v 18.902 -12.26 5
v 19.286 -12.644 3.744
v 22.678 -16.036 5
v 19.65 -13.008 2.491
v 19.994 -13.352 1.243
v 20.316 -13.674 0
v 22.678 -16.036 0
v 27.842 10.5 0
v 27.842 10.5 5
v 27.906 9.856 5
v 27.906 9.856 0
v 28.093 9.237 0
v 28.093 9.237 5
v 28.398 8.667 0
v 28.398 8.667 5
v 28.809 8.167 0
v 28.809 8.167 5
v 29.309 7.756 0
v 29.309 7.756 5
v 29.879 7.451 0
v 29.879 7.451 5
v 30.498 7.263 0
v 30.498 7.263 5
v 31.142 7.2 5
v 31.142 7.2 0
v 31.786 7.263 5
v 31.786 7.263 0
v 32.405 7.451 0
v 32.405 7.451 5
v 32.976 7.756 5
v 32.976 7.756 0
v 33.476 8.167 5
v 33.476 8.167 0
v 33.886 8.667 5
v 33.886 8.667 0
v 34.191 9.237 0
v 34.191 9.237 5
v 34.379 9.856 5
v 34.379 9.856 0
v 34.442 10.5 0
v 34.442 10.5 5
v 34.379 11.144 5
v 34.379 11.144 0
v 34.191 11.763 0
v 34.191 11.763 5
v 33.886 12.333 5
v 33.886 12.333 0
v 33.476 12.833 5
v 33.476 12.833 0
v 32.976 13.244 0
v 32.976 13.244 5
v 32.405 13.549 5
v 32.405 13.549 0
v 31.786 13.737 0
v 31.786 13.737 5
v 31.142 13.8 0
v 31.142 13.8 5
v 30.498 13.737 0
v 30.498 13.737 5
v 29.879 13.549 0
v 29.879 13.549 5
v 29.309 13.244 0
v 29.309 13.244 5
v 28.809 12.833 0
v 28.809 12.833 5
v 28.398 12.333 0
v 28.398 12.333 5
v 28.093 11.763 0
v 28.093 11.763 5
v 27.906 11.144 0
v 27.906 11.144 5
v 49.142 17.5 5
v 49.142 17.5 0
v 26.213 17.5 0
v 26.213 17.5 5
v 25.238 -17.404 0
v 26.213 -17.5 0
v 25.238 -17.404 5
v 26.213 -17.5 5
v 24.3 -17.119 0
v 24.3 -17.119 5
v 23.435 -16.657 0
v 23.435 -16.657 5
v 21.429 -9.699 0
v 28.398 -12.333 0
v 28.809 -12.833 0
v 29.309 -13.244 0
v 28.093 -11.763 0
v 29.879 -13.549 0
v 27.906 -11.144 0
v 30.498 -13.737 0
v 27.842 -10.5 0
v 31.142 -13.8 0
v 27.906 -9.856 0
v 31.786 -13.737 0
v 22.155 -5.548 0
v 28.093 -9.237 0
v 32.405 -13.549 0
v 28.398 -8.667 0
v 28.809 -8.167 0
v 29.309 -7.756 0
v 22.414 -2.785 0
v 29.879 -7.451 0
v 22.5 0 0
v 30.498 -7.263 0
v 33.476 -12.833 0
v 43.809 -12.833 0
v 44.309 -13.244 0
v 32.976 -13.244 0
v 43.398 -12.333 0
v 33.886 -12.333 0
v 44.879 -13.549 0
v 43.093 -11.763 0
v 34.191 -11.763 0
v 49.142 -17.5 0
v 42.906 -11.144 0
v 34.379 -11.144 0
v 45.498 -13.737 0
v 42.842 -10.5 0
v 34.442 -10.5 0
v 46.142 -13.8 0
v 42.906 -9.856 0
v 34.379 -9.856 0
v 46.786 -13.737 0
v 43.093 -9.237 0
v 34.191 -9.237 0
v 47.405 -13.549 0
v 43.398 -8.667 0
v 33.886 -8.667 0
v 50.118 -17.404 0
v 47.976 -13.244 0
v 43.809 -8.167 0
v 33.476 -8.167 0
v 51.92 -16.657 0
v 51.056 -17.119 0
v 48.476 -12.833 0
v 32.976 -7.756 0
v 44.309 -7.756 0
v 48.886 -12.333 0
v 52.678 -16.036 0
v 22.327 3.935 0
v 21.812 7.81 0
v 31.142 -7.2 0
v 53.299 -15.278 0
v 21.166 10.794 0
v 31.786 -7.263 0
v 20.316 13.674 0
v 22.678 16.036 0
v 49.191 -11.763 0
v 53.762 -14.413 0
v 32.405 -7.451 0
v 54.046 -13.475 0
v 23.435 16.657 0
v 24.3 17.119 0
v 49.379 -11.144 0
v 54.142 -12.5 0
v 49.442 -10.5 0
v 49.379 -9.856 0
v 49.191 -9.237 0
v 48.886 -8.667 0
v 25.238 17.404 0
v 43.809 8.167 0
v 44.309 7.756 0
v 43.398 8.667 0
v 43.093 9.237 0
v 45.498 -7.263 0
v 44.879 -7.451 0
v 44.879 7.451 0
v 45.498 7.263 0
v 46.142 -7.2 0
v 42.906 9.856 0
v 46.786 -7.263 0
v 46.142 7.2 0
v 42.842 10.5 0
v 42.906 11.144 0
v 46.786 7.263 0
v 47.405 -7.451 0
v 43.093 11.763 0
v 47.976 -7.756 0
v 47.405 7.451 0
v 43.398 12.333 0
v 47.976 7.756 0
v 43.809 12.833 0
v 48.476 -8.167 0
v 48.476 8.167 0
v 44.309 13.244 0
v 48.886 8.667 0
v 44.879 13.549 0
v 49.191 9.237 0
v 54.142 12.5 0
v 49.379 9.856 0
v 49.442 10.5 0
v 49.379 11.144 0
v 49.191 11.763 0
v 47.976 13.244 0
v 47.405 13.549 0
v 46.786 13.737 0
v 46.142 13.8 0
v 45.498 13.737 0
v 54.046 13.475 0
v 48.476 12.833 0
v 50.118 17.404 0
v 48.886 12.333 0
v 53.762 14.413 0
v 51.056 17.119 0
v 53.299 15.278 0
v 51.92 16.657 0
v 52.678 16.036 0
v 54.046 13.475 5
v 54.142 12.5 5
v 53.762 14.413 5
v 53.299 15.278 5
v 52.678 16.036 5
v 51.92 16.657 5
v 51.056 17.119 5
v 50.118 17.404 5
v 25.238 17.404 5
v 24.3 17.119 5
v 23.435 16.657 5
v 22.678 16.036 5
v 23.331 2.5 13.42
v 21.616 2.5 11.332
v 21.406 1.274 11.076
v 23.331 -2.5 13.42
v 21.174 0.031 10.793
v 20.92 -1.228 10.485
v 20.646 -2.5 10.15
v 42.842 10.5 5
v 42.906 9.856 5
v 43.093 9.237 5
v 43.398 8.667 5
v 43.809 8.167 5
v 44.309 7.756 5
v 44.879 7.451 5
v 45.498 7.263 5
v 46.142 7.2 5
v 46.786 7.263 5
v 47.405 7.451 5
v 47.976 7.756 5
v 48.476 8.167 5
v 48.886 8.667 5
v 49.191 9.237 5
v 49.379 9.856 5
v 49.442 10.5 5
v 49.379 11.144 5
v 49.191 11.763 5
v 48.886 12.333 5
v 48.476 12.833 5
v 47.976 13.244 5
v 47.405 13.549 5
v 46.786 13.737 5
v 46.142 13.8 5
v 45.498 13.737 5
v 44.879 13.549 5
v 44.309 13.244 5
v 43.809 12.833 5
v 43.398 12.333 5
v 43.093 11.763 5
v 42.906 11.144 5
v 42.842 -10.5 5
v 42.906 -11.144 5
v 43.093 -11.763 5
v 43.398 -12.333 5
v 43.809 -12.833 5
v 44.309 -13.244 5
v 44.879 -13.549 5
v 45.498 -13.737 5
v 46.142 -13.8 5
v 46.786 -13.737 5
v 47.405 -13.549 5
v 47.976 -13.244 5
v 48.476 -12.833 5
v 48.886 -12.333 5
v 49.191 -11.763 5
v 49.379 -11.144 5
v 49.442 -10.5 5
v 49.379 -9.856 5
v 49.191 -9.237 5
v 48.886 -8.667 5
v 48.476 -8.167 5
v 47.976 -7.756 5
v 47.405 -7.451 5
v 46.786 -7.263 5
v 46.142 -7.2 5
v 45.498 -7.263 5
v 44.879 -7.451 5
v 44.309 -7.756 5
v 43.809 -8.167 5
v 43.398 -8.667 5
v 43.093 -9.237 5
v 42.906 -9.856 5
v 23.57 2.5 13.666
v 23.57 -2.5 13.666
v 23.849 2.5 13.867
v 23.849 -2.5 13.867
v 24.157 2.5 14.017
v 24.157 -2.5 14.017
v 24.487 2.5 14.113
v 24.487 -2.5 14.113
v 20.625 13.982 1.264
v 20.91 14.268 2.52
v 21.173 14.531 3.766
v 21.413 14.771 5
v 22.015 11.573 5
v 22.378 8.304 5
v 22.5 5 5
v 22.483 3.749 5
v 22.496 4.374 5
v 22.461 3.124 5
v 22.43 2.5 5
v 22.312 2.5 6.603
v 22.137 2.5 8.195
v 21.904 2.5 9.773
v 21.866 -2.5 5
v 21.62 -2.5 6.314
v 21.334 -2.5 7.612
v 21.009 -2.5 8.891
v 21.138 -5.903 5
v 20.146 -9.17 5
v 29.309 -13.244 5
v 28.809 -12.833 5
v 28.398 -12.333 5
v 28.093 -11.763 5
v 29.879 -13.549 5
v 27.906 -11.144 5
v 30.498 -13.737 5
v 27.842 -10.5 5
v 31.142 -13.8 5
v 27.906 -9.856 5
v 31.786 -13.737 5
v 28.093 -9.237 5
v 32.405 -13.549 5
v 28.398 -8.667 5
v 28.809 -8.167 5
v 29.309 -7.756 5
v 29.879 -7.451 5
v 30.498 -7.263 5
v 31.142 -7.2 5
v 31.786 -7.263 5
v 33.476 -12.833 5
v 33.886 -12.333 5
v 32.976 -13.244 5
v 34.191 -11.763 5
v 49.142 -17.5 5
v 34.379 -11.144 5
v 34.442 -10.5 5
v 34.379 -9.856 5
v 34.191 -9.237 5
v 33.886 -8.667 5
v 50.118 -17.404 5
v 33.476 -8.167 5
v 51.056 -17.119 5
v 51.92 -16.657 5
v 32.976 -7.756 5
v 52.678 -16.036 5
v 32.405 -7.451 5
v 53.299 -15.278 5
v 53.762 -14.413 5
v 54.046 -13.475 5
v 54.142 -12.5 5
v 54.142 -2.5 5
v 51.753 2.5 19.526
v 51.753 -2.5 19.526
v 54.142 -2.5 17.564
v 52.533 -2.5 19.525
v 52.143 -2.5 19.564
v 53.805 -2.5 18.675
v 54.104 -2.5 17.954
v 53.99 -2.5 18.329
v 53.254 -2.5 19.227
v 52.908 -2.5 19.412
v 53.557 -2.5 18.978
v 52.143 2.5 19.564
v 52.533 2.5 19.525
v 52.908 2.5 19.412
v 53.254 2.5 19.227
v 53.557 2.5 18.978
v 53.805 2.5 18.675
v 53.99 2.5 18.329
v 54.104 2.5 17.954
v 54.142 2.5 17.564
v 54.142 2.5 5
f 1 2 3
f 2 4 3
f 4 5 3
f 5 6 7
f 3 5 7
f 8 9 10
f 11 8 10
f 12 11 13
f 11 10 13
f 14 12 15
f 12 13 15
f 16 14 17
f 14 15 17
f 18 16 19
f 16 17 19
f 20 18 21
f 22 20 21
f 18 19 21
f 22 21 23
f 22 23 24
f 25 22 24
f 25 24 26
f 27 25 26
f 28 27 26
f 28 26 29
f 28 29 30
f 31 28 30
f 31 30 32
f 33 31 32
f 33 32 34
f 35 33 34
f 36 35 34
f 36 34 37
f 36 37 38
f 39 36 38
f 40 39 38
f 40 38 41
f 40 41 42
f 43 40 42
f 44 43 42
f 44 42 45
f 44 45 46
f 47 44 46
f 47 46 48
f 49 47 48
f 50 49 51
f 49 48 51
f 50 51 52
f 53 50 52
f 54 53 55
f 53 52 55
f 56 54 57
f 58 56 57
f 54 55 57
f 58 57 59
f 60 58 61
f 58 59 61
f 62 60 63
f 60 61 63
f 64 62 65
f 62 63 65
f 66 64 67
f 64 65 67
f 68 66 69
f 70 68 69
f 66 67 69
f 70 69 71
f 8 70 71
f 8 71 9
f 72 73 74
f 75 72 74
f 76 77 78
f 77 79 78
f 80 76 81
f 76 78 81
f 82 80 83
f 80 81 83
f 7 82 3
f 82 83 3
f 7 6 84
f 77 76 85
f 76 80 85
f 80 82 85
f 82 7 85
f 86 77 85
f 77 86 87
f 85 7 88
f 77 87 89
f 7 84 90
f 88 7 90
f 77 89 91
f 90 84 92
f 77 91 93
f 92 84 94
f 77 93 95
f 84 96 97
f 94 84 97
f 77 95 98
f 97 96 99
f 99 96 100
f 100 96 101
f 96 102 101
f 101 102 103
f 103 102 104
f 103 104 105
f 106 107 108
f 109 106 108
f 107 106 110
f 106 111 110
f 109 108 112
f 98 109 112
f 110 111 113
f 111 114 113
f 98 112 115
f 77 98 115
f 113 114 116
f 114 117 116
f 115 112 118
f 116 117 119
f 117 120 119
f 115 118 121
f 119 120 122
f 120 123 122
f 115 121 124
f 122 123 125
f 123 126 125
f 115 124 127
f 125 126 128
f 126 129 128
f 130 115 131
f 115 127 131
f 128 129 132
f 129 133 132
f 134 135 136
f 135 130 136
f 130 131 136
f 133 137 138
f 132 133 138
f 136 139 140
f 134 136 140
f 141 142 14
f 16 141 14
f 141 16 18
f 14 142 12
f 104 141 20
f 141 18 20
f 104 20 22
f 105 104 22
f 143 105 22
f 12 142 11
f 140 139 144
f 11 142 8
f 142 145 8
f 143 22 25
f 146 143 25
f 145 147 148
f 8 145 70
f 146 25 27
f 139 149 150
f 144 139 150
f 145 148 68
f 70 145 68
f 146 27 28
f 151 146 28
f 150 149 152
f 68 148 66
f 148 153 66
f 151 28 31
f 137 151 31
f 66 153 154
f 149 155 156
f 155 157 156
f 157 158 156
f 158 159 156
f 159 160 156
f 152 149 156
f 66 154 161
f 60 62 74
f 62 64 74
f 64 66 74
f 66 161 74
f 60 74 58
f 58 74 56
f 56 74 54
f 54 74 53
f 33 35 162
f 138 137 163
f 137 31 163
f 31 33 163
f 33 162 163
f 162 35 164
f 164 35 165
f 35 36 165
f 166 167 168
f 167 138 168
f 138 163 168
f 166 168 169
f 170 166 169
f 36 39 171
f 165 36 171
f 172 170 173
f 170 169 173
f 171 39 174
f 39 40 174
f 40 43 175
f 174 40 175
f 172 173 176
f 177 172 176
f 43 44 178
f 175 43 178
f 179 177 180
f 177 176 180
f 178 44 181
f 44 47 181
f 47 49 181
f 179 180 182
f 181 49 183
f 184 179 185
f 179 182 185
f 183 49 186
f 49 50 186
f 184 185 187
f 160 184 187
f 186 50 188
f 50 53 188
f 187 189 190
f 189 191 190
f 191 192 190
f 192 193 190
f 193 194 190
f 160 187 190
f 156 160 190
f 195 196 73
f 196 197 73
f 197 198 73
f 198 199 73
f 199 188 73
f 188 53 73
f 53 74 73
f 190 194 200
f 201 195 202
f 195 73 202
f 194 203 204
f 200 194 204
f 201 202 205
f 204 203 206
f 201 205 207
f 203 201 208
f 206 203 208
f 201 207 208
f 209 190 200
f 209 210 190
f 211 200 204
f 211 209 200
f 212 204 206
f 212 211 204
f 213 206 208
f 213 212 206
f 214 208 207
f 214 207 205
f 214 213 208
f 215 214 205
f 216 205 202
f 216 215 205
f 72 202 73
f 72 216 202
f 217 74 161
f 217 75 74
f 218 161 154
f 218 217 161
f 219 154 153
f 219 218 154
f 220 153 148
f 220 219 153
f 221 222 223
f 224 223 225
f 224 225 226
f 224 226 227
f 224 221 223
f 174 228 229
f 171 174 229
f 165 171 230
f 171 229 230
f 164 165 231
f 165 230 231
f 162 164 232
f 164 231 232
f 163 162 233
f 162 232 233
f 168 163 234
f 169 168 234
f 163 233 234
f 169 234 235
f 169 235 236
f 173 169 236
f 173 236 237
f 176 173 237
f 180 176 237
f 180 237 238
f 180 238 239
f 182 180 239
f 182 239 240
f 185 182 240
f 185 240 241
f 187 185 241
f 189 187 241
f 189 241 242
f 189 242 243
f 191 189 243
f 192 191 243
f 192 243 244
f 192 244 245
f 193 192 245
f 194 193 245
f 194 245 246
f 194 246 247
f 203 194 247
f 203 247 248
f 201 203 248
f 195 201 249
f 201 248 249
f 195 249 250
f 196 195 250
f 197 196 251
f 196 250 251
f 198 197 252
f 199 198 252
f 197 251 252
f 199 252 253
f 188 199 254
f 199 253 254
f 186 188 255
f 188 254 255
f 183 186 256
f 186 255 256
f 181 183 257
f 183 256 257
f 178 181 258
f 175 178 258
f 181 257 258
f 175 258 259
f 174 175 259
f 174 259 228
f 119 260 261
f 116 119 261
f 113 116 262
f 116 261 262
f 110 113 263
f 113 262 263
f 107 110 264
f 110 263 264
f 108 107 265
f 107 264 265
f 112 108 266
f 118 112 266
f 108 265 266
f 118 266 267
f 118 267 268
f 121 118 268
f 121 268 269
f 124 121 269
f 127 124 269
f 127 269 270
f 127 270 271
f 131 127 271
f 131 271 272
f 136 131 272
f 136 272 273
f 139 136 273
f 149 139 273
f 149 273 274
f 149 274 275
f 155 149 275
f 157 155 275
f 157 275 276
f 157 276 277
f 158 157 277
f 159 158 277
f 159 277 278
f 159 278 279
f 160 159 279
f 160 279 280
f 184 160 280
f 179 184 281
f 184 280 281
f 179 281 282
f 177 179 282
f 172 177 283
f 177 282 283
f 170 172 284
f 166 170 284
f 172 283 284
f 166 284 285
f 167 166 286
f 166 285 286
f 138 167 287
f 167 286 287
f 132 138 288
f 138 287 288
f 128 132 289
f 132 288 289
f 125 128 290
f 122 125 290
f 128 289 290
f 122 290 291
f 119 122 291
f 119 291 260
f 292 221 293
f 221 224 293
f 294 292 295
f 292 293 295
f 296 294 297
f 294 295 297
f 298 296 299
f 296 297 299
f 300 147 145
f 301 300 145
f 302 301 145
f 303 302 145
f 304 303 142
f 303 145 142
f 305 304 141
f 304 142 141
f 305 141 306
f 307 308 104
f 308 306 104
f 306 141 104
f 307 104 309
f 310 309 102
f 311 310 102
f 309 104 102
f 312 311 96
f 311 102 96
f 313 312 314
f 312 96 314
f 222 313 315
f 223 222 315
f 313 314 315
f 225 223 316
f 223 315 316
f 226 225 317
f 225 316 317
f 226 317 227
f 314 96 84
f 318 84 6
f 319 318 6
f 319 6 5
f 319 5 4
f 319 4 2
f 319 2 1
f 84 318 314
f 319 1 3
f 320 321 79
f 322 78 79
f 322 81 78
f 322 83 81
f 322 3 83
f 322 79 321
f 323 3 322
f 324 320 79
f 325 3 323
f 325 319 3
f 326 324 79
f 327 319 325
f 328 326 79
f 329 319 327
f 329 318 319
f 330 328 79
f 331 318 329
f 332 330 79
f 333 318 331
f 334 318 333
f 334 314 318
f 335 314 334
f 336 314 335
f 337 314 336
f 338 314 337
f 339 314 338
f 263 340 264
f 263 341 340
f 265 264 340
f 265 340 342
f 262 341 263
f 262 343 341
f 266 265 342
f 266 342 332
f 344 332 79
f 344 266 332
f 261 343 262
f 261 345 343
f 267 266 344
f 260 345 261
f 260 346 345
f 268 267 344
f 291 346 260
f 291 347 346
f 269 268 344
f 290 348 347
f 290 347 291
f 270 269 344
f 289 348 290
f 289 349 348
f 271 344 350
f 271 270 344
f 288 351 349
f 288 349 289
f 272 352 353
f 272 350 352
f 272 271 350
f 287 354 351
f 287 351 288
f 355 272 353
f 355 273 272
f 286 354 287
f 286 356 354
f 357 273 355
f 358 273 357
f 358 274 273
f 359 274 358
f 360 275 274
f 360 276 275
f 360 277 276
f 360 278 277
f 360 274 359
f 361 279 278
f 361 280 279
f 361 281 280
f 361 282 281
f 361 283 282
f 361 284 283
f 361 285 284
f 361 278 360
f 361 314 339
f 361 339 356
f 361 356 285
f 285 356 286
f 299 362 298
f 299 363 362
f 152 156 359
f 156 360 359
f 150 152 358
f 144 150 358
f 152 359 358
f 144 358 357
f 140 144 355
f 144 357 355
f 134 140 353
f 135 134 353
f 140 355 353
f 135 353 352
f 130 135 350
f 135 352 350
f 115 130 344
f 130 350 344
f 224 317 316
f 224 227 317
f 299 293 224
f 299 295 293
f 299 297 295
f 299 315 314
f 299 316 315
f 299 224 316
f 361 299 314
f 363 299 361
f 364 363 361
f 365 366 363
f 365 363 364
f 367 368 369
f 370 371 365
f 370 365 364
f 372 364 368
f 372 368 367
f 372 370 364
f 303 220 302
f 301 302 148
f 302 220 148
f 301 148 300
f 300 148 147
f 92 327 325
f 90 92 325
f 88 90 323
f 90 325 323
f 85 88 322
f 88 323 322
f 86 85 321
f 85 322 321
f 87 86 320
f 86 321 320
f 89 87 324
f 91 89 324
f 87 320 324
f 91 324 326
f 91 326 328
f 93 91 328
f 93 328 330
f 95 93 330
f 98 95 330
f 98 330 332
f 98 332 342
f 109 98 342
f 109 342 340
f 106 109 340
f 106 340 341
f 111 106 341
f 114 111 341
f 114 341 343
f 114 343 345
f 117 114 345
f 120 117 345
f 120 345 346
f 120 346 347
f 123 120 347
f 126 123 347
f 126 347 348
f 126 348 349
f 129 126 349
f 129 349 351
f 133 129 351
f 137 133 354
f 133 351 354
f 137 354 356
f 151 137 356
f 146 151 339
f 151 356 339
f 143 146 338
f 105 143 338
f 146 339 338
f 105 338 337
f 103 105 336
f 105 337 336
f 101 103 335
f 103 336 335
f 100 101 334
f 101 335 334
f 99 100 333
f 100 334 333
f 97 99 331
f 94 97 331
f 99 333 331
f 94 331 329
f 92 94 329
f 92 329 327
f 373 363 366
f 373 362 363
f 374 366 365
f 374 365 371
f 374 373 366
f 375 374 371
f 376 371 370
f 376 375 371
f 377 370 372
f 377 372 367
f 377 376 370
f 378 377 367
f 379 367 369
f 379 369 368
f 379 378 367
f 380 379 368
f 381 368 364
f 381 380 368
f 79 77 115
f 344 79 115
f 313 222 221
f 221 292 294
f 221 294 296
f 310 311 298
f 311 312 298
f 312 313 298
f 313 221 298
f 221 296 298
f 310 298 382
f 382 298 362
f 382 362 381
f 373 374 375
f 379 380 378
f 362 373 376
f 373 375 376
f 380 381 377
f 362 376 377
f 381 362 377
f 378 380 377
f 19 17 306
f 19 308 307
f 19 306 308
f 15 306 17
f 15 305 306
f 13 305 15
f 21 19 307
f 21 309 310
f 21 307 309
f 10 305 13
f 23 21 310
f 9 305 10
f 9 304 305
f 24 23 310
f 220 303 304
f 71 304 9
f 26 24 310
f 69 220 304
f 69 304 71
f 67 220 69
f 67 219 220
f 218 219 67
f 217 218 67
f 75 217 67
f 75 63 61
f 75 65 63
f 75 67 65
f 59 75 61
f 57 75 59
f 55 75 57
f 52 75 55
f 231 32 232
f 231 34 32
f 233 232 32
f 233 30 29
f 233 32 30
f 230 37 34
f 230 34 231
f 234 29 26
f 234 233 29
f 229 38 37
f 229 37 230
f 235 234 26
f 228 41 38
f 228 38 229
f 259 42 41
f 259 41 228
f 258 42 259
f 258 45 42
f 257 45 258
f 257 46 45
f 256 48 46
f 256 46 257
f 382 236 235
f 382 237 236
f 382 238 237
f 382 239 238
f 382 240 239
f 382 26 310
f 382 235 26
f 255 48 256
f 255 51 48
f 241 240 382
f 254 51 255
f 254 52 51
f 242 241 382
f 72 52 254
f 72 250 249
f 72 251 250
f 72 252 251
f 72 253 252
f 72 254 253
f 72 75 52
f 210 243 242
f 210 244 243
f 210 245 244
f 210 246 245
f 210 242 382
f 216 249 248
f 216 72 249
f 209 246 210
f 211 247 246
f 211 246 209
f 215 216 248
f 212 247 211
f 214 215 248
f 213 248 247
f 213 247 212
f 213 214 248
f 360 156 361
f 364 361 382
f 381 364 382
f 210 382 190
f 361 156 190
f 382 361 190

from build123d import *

# Parameters (mm, degrees)
F1_DEPTH  = 5
F3_DEPTH  = 2.5
F4_SIZE   = 5
F5_R      = 2
F6_R      = 2
F7_D      = 6.6
F7_DEPTH  = 43
F7_TIP    = 1.9828400428
F8_R      = 5
F10_R     = 22.5
F11_DEPTH = 25


with BuildPart() as f1:
    # F0 (on Top) → F1 (new body)
    with BuildSketch(Plane.XY):
        with BuildLine():
            Line((54.1421356237, 17.5), (24.1421356237, 17.5))
            Line((24.1421356237, 17.5), (18.8804864575, 12.2383508337))
            ThreePointArc((18.8804864575, 12.2383508337), (22.5, 0), (18.8804864575, -12.2383508337))
            Line((18.8804864575, -12.2383508337), (24.1421356237, -17.5))
            Line((24.1421356237, -17.5), (54.1421356237, -17.5))
            Line((54.1421356237, -17.5), (54.1421356237, 17.5))
        make_face()
        with BuildLine():
            ThreePointArc((18.8804864575, -12.2383508337), (22.5, 0), (18.8804864575, 12.2383508337))
            Line((18.8804864575, 12.2383508337), (18.8804864575, -12.2383508337))
        make_face()
    extrude(amount=F1_DEPTH)

    # F2 (on Front) → F3 (join, symmetric)
    with BuildSketch(Plane.XZ):
        Polygon((54.1421356237, 20), (18.8804864575, 13), (18.8804864575, 5), (54.1421356237, 5), align=None)
    extrude(amount=F3_DEPTH, both=True)

    # F4
    f4_edges = [f1.edges().sort_by_distance(p)[0] for p in [
        (18.880486, 0, 13),
    ]]
    chamfer(f4_edges, length=F4_SIZE)

    # F5
    f5_edges = [f1.edges().sort_by_distance(p)[0] for p in [
        (23.784784, 0, 13.973581),
    ]]
    fillet(f5_edges, radius=F5_R)

    # F6
    f6_edges = [f1.edges().sort_by_distance(p)[0] for p in [
        (54.142136, 0, 20),
    ]]
    fillet(f6_edges, radius=F6_R)

    # F7
    with Locations(Plane(origin=(0, 0, 0), x_dir=(1, 0, 0), z_dir=(0, 0, -1))):
        with Locations((31.1421356237, -10.5), (46.1421356237, -10.5), (46.1421356237, 10.5), (31.1421356237, 10.5)):
            Hole(F7_D / 2, depth=F7_DEPTH)
            with Locations((0, 0, -(F7_DEPTH + F7_TIP / 2))):  # 118° drill point
                Cone(0, F7_D / 2, F7_TIP, mode=Mode.SUBTRACT)

    # F8
    f8_edges = [f1.edges().sort_by_distance(p)[0] for p in [
        (24.142136, -17.5, 2.5),
        (24.142136, 17.5, 2.5),
        (54.142136, -17.5, 2.5),
        (54.142136, 17.5, 2.5),
    ]]
    fillet(f8_edges, radius=F8_R)

    # F10 (on face) → F11 (cut, symmetric)
    with BuildSketch(Plane(origin=(0, 0, 0), x_dir=(1, 0, 0), z_dir=(0, -0.7071067812, -0.7071067812))):
        Circle(F10_R)
    extrude(amount=F11_DEPTH, both=True, mode=Mode.SUBTRACT)


solid = f1.part
